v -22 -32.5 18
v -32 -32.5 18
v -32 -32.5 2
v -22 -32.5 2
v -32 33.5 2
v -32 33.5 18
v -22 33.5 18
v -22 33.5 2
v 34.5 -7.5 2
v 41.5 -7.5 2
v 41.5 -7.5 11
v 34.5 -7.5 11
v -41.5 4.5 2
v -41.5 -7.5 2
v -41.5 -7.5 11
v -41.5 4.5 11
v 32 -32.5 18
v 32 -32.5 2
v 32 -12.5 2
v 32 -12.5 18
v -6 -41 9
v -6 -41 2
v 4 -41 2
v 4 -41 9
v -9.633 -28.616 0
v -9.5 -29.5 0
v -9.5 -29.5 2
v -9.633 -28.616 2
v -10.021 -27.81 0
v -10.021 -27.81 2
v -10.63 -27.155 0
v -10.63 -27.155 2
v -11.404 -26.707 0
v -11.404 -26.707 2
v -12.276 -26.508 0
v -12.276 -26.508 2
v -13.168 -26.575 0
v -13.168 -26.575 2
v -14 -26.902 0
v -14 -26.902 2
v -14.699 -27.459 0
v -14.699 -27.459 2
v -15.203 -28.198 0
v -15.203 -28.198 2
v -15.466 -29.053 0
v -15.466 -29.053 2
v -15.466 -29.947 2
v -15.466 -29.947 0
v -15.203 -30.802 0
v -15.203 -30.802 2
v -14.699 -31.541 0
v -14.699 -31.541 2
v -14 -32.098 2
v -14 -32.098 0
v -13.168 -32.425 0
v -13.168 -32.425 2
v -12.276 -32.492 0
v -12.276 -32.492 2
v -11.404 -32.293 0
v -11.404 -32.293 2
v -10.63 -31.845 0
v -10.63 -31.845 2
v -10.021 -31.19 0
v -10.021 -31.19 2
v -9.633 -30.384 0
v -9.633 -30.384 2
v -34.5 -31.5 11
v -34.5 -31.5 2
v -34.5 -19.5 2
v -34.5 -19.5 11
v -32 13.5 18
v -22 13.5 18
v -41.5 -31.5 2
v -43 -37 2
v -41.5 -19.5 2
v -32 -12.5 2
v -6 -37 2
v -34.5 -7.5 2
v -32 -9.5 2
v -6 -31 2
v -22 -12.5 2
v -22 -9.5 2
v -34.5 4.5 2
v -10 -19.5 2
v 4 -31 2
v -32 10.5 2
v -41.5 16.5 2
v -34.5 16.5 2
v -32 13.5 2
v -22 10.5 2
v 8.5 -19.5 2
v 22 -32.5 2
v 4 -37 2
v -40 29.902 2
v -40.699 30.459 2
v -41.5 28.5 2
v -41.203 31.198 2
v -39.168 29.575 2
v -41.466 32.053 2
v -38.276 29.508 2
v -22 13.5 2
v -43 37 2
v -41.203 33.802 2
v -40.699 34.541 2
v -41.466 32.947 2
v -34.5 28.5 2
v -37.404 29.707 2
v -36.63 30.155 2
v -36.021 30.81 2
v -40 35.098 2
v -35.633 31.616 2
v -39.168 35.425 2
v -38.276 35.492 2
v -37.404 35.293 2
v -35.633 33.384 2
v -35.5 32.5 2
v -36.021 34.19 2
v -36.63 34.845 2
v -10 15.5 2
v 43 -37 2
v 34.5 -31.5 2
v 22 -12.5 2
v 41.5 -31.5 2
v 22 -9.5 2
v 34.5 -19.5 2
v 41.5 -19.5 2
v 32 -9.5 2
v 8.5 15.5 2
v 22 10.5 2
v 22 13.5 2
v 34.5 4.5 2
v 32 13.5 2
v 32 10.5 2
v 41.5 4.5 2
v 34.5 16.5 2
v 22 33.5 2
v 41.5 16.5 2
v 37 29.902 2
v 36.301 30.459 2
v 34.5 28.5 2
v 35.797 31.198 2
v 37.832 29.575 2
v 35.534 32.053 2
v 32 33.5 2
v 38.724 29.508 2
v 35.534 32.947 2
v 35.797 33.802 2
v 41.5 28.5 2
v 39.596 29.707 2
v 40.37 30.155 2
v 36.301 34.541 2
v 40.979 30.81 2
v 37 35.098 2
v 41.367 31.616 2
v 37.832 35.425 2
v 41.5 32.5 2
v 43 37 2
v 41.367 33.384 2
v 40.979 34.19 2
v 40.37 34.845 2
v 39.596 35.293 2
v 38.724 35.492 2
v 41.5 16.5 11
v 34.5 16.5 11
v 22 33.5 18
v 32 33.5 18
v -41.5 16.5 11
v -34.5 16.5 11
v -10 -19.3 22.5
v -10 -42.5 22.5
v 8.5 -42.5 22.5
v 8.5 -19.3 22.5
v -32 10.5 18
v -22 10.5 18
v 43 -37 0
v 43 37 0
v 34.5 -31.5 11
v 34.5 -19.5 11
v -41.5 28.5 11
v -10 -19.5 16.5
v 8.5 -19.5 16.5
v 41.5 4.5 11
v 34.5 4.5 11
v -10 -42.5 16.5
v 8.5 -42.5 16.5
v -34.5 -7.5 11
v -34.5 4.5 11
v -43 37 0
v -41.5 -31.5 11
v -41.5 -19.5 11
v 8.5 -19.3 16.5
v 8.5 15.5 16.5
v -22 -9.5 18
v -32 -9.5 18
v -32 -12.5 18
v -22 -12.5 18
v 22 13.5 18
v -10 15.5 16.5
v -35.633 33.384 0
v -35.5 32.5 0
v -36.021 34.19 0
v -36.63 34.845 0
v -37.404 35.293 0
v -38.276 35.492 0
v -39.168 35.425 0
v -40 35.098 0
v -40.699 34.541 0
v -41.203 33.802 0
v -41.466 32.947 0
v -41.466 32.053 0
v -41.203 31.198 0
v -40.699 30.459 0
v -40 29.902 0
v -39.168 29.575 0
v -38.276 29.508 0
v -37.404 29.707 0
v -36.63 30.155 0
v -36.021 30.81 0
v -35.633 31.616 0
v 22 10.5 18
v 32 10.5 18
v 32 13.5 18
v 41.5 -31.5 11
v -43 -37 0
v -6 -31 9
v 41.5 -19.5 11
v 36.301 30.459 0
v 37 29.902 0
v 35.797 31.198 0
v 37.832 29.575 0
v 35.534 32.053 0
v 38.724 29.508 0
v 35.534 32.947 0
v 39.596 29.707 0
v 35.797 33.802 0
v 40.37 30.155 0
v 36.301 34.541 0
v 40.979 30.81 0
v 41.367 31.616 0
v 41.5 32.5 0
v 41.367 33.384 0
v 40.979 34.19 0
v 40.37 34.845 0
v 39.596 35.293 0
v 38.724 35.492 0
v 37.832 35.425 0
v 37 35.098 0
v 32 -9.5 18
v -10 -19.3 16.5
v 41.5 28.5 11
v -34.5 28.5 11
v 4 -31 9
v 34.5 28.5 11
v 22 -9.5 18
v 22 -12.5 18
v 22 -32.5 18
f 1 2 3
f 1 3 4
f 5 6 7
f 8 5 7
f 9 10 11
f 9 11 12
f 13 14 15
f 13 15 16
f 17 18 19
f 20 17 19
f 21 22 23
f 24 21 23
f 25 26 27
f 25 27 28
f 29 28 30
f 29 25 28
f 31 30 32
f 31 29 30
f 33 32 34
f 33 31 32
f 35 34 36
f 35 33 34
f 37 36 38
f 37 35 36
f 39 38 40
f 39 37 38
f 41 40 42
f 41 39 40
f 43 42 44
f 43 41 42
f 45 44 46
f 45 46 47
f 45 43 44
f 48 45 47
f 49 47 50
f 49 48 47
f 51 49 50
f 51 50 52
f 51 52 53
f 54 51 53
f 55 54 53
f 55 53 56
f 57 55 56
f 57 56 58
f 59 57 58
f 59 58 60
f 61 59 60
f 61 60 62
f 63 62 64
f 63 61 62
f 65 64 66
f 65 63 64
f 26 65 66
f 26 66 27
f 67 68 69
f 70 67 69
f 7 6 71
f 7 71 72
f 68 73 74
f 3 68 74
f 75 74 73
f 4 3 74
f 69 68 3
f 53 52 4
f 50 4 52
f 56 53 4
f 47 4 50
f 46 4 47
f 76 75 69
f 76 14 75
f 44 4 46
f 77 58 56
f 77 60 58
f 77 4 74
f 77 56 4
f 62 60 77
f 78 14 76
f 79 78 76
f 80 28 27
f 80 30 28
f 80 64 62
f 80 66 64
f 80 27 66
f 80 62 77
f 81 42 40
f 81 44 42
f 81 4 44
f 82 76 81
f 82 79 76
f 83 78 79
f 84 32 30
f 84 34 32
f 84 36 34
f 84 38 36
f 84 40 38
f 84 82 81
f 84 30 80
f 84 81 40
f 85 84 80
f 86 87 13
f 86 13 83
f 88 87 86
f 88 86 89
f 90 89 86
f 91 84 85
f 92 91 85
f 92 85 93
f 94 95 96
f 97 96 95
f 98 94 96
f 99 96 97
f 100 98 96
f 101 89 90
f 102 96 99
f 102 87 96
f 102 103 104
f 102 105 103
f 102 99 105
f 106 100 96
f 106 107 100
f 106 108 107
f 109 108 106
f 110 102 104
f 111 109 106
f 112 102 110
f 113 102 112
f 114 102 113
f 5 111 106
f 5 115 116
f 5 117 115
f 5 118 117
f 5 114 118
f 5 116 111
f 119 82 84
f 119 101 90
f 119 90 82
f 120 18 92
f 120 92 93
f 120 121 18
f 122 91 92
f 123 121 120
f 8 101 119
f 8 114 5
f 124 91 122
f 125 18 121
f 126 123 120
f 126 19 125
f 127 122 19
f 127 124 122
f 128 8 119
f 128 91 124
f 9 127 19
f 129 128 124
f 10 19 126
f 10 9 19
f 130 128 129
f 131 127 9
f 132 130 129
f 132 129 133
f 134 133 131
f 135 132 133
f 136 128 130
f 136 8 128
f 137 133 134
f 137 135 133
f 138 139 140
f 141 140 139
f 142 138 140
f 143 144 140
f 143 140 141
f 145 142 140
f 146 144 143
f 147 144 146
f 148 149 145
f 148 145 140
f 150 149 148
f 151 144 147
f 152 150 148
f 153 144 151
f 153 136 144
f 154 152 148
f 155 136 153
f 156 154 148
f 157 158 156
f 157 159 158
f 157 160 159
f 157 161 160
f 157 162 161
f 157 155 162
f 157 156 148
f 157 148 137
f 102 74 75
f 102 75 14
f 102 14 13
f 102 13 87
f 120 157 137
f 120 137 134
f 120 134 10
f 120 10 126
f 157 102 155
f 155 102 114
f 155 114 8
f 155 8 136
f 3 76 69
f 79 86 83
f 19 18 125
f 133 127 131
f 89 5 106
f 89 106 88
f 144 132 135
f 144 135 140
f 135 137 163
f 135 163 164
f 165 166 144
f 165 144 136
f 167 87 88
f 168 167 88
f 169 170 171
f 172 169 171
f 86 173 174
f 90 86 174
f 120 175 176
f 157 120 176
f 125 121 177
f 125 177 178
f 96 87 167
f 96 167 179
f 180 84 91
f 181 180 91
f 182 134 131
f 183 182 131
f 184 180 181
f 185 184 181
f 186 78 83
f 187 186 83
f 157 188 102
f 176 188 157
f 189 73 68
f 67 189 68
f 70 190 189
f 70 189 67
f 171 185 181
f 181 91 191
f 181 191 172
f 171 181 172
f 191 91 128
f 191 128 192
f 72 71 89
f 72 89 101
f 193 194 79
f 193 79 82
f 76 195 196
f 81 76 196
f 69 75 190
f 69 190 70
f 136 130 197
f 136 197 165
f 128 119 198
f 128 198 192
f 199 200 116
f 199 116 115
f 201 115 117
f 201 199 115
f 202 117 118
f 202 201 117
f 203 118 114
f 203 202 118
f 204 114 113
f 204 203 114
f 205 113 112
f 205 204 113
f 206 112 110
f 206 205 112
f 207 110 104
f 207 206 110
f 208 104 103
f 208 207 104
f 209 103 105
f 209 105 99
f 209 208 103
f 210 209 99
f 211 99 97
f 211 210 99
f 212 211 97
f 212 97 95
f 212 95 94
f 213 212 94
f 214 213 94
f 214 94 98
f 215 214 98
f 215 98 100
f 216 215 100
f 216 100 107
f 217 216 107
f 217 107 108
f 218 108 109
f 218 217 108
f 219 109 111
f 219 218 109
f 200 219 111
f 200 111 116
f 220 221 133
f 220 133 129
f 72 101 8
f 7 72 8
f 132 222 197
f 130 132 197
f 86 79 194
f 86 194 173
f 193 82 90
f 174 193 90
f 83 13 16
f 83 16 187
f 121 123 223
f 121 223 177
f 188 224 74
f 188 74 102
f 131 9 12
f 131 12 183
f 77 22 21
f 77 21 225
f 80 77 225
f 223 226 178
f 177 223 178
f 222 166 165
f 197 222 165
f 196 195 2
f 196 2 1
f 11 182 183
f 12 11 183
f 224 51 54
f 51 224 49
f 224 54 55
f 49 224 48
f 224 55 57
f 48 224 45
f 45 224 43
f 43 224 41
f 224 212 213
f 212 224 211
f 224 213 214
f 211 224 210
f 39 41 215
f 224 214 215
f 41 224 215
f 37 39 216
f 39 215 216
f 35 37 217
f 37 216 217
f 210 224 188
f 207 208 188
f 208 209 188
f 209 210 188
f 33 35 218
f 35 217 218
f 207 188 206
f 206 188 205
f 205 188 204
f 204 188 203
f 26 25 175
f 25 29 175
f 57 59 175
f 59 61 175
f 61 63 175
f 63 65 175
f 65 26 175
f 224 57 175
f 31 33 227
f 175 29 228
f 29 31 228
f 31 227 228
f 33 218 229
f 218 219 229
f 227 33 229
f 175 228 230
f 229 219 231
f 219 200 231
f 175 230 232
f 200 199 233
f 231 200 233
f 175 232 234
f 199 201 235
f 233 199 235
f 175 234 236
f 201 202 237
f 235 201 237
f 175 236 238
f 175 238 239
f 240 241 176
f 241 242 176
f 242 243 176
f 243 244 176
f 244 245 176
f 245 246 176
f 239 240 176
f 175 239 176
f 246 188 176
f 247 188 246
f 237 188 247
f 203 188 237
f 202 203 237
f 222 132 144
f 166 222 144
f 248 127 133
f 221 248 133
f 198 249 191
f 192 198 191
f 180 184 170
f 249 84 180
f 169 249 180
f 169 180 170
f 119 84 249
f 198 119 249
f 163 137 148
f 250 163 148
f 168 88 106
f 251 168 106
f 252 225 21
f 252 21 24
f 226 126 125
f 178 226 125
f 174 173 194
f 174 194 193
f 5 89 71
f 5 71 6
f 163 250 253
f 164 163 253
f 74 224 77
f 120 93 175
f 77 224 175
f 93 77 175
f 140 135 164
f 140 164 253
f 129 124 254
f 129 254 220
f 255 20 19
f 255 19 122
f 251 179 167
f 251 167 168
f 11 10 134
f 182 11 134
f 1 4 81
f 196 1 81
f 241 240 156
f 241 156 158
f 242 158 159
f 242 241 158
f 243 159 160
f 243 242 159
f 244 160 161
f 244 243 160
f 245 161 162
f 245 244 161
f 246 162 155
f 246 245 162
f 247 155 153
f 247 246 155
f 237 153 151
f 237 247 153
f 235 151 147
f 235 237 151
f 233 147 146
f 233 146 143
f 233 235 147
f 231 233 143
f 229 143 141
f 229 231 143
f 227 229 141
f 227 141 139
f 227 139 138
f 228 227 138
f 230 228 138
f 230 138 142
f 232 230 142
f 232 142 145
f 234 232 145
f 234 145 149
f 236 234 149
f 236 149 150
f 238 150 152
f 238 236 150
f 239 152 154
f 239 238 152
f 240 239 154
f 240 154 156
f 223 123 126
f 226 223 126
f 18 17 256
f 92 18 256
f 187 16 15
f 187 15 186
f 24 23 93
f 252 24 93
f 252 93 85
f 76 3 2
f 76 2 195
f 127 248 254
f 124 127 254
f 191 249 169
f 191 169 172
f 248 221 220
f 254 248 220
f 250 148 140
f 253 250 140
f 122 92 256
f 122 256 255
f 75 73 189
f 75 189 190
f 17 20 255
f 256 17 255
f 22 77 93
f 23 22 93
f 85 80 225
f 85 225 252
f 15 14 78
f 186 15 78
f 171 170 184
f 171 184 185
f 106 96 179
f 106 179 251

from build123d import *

# Parameters (mm, degrees)
SKETCH_W     = 86
SKETCH_H     = 74
SKETCH_R     = 3
PAD_DEPTH    = 2
SKETCH001_W  = 7
SKETCH001_H  = 12
PAD001_DEPTH = 9
SKETCH002_W  = 18.5
SKETCH002_H  = 35
PAD002_DEPTH = 14.5
SKETCH003_W  = 18.5
SKETCH003_H  = 0.2
PAD003_DEPTH = 6
SKETCH004_W  = 18.5
SKETCH004_H  = 6
PAD004_DEPTH = 23
SKETCH005_W  = 10
SKETCH005_H  = 20
PAD005_DEPTH = 16
SKETCH006_W  = 10
SKETCH006_H  = 10
PAD006_DEPTH = 7


with BuildPart() as part:
    # Sketch → Pad (new body)
    with BuildSketch(Plane.XY):
        Rectangle(SKETCH_W, SKETCH_H)
        with Locations((-38.5, 32.5)):
            Circle(SKETCH_R, mode=Mode.SUBTRACT)
        with Locations((38.5, 32.5)):
            Circle(SKETCH_R, mode=Mode.SUBTRACT)
        with Locations((-12.5, -29.5)):
            Circle(SKETCH_R, mode=Mode.SUBTRACT)
    extrude(amount=PAD_DEPTH)

    # Sketch001 → Pad001 (new body)
    with BuildSketch(Plane.XY.offset(2)):
        with Locations((-38, 22.5)):
            Rectangle(SKETCH001_W, SKETCH001_H)
        with Locations((-38, -1.5)):
            Rectangle(SKETCH001_W, SKETCH001_H)
        with Locations((-38, -25.5)):
            Rectangle(SKETCH001_W, SKETCH001_H)
    pad001 = extrude(amount=PAD001_DEPTH)

    # Mirrored: Pad001 across Sketch001 V_Axis
    add(pad001.mirror(Plane(origin=(0, 0, 2), x_dir=(0, 0, 1), z_dir=(1, 0, 0))))

    # Sketch002 → Pad002 (new body)
    with BuildSketch(Plane.XY.offset(2)):
        with Locations((-0.75, -2)):
            Rectangle(SKETCH002_W, SKETCH002_H)
    extrude(amount=PAD002_DEPTH)

    # Sketch003 → Pad003 (new body)
    with BuildSketch(Plane.XY.offset(16.5)):
        with Locations((-0.75, -19.4)):
            Rectangle(SKETCH003_W, SKETCH003_H)
    extrude(amount=PAD003_DEPTH)

    # Sketch004 → Pad004 (new body)
    with BuildSketch(Plane.XZ.offset(19.5)):
        with Locations((-0.75, 19.5)):
            Rectangle(SKETCH004_W, SKETCH004_H)
    extrude(amount=PAD004_DEPTH)

    # Sketch005 → Pad005 (new body)
    with BuildSketch(Plane.XY.offset(2)):
        with Locations((-27, 23.5)):
            Rectangle(SKETCH005_W, SKETCH005_H)
        with Locations((-27, 0.5)):
            Rectangle(SKETCH005_W, SKETCH005_H)
        with Locations((-27, -22.5)):
            Rectangle(SKETCH005_W, SKETCH005_H)
    pad005 = extrude(amount=PAD005_DEPTH)

    # Mirrored001: Pad005 across Sketch005 V_Axis
    add(pad005.mirror(Plane(origin=(0, 0, 2), x_dir=(0, 0, 1), z_dir=(1, 0, 0))))

    # Sketch006 → Pad006 (new body)
    with BuildSketch(Plane.XY.offset(2)):
        with Locations((-1, -36)):
            Rectangle(SKETCH006_W, SKETCH006_H)
    extrude(amount=PAD006_DEPTH)


solid = part.part
